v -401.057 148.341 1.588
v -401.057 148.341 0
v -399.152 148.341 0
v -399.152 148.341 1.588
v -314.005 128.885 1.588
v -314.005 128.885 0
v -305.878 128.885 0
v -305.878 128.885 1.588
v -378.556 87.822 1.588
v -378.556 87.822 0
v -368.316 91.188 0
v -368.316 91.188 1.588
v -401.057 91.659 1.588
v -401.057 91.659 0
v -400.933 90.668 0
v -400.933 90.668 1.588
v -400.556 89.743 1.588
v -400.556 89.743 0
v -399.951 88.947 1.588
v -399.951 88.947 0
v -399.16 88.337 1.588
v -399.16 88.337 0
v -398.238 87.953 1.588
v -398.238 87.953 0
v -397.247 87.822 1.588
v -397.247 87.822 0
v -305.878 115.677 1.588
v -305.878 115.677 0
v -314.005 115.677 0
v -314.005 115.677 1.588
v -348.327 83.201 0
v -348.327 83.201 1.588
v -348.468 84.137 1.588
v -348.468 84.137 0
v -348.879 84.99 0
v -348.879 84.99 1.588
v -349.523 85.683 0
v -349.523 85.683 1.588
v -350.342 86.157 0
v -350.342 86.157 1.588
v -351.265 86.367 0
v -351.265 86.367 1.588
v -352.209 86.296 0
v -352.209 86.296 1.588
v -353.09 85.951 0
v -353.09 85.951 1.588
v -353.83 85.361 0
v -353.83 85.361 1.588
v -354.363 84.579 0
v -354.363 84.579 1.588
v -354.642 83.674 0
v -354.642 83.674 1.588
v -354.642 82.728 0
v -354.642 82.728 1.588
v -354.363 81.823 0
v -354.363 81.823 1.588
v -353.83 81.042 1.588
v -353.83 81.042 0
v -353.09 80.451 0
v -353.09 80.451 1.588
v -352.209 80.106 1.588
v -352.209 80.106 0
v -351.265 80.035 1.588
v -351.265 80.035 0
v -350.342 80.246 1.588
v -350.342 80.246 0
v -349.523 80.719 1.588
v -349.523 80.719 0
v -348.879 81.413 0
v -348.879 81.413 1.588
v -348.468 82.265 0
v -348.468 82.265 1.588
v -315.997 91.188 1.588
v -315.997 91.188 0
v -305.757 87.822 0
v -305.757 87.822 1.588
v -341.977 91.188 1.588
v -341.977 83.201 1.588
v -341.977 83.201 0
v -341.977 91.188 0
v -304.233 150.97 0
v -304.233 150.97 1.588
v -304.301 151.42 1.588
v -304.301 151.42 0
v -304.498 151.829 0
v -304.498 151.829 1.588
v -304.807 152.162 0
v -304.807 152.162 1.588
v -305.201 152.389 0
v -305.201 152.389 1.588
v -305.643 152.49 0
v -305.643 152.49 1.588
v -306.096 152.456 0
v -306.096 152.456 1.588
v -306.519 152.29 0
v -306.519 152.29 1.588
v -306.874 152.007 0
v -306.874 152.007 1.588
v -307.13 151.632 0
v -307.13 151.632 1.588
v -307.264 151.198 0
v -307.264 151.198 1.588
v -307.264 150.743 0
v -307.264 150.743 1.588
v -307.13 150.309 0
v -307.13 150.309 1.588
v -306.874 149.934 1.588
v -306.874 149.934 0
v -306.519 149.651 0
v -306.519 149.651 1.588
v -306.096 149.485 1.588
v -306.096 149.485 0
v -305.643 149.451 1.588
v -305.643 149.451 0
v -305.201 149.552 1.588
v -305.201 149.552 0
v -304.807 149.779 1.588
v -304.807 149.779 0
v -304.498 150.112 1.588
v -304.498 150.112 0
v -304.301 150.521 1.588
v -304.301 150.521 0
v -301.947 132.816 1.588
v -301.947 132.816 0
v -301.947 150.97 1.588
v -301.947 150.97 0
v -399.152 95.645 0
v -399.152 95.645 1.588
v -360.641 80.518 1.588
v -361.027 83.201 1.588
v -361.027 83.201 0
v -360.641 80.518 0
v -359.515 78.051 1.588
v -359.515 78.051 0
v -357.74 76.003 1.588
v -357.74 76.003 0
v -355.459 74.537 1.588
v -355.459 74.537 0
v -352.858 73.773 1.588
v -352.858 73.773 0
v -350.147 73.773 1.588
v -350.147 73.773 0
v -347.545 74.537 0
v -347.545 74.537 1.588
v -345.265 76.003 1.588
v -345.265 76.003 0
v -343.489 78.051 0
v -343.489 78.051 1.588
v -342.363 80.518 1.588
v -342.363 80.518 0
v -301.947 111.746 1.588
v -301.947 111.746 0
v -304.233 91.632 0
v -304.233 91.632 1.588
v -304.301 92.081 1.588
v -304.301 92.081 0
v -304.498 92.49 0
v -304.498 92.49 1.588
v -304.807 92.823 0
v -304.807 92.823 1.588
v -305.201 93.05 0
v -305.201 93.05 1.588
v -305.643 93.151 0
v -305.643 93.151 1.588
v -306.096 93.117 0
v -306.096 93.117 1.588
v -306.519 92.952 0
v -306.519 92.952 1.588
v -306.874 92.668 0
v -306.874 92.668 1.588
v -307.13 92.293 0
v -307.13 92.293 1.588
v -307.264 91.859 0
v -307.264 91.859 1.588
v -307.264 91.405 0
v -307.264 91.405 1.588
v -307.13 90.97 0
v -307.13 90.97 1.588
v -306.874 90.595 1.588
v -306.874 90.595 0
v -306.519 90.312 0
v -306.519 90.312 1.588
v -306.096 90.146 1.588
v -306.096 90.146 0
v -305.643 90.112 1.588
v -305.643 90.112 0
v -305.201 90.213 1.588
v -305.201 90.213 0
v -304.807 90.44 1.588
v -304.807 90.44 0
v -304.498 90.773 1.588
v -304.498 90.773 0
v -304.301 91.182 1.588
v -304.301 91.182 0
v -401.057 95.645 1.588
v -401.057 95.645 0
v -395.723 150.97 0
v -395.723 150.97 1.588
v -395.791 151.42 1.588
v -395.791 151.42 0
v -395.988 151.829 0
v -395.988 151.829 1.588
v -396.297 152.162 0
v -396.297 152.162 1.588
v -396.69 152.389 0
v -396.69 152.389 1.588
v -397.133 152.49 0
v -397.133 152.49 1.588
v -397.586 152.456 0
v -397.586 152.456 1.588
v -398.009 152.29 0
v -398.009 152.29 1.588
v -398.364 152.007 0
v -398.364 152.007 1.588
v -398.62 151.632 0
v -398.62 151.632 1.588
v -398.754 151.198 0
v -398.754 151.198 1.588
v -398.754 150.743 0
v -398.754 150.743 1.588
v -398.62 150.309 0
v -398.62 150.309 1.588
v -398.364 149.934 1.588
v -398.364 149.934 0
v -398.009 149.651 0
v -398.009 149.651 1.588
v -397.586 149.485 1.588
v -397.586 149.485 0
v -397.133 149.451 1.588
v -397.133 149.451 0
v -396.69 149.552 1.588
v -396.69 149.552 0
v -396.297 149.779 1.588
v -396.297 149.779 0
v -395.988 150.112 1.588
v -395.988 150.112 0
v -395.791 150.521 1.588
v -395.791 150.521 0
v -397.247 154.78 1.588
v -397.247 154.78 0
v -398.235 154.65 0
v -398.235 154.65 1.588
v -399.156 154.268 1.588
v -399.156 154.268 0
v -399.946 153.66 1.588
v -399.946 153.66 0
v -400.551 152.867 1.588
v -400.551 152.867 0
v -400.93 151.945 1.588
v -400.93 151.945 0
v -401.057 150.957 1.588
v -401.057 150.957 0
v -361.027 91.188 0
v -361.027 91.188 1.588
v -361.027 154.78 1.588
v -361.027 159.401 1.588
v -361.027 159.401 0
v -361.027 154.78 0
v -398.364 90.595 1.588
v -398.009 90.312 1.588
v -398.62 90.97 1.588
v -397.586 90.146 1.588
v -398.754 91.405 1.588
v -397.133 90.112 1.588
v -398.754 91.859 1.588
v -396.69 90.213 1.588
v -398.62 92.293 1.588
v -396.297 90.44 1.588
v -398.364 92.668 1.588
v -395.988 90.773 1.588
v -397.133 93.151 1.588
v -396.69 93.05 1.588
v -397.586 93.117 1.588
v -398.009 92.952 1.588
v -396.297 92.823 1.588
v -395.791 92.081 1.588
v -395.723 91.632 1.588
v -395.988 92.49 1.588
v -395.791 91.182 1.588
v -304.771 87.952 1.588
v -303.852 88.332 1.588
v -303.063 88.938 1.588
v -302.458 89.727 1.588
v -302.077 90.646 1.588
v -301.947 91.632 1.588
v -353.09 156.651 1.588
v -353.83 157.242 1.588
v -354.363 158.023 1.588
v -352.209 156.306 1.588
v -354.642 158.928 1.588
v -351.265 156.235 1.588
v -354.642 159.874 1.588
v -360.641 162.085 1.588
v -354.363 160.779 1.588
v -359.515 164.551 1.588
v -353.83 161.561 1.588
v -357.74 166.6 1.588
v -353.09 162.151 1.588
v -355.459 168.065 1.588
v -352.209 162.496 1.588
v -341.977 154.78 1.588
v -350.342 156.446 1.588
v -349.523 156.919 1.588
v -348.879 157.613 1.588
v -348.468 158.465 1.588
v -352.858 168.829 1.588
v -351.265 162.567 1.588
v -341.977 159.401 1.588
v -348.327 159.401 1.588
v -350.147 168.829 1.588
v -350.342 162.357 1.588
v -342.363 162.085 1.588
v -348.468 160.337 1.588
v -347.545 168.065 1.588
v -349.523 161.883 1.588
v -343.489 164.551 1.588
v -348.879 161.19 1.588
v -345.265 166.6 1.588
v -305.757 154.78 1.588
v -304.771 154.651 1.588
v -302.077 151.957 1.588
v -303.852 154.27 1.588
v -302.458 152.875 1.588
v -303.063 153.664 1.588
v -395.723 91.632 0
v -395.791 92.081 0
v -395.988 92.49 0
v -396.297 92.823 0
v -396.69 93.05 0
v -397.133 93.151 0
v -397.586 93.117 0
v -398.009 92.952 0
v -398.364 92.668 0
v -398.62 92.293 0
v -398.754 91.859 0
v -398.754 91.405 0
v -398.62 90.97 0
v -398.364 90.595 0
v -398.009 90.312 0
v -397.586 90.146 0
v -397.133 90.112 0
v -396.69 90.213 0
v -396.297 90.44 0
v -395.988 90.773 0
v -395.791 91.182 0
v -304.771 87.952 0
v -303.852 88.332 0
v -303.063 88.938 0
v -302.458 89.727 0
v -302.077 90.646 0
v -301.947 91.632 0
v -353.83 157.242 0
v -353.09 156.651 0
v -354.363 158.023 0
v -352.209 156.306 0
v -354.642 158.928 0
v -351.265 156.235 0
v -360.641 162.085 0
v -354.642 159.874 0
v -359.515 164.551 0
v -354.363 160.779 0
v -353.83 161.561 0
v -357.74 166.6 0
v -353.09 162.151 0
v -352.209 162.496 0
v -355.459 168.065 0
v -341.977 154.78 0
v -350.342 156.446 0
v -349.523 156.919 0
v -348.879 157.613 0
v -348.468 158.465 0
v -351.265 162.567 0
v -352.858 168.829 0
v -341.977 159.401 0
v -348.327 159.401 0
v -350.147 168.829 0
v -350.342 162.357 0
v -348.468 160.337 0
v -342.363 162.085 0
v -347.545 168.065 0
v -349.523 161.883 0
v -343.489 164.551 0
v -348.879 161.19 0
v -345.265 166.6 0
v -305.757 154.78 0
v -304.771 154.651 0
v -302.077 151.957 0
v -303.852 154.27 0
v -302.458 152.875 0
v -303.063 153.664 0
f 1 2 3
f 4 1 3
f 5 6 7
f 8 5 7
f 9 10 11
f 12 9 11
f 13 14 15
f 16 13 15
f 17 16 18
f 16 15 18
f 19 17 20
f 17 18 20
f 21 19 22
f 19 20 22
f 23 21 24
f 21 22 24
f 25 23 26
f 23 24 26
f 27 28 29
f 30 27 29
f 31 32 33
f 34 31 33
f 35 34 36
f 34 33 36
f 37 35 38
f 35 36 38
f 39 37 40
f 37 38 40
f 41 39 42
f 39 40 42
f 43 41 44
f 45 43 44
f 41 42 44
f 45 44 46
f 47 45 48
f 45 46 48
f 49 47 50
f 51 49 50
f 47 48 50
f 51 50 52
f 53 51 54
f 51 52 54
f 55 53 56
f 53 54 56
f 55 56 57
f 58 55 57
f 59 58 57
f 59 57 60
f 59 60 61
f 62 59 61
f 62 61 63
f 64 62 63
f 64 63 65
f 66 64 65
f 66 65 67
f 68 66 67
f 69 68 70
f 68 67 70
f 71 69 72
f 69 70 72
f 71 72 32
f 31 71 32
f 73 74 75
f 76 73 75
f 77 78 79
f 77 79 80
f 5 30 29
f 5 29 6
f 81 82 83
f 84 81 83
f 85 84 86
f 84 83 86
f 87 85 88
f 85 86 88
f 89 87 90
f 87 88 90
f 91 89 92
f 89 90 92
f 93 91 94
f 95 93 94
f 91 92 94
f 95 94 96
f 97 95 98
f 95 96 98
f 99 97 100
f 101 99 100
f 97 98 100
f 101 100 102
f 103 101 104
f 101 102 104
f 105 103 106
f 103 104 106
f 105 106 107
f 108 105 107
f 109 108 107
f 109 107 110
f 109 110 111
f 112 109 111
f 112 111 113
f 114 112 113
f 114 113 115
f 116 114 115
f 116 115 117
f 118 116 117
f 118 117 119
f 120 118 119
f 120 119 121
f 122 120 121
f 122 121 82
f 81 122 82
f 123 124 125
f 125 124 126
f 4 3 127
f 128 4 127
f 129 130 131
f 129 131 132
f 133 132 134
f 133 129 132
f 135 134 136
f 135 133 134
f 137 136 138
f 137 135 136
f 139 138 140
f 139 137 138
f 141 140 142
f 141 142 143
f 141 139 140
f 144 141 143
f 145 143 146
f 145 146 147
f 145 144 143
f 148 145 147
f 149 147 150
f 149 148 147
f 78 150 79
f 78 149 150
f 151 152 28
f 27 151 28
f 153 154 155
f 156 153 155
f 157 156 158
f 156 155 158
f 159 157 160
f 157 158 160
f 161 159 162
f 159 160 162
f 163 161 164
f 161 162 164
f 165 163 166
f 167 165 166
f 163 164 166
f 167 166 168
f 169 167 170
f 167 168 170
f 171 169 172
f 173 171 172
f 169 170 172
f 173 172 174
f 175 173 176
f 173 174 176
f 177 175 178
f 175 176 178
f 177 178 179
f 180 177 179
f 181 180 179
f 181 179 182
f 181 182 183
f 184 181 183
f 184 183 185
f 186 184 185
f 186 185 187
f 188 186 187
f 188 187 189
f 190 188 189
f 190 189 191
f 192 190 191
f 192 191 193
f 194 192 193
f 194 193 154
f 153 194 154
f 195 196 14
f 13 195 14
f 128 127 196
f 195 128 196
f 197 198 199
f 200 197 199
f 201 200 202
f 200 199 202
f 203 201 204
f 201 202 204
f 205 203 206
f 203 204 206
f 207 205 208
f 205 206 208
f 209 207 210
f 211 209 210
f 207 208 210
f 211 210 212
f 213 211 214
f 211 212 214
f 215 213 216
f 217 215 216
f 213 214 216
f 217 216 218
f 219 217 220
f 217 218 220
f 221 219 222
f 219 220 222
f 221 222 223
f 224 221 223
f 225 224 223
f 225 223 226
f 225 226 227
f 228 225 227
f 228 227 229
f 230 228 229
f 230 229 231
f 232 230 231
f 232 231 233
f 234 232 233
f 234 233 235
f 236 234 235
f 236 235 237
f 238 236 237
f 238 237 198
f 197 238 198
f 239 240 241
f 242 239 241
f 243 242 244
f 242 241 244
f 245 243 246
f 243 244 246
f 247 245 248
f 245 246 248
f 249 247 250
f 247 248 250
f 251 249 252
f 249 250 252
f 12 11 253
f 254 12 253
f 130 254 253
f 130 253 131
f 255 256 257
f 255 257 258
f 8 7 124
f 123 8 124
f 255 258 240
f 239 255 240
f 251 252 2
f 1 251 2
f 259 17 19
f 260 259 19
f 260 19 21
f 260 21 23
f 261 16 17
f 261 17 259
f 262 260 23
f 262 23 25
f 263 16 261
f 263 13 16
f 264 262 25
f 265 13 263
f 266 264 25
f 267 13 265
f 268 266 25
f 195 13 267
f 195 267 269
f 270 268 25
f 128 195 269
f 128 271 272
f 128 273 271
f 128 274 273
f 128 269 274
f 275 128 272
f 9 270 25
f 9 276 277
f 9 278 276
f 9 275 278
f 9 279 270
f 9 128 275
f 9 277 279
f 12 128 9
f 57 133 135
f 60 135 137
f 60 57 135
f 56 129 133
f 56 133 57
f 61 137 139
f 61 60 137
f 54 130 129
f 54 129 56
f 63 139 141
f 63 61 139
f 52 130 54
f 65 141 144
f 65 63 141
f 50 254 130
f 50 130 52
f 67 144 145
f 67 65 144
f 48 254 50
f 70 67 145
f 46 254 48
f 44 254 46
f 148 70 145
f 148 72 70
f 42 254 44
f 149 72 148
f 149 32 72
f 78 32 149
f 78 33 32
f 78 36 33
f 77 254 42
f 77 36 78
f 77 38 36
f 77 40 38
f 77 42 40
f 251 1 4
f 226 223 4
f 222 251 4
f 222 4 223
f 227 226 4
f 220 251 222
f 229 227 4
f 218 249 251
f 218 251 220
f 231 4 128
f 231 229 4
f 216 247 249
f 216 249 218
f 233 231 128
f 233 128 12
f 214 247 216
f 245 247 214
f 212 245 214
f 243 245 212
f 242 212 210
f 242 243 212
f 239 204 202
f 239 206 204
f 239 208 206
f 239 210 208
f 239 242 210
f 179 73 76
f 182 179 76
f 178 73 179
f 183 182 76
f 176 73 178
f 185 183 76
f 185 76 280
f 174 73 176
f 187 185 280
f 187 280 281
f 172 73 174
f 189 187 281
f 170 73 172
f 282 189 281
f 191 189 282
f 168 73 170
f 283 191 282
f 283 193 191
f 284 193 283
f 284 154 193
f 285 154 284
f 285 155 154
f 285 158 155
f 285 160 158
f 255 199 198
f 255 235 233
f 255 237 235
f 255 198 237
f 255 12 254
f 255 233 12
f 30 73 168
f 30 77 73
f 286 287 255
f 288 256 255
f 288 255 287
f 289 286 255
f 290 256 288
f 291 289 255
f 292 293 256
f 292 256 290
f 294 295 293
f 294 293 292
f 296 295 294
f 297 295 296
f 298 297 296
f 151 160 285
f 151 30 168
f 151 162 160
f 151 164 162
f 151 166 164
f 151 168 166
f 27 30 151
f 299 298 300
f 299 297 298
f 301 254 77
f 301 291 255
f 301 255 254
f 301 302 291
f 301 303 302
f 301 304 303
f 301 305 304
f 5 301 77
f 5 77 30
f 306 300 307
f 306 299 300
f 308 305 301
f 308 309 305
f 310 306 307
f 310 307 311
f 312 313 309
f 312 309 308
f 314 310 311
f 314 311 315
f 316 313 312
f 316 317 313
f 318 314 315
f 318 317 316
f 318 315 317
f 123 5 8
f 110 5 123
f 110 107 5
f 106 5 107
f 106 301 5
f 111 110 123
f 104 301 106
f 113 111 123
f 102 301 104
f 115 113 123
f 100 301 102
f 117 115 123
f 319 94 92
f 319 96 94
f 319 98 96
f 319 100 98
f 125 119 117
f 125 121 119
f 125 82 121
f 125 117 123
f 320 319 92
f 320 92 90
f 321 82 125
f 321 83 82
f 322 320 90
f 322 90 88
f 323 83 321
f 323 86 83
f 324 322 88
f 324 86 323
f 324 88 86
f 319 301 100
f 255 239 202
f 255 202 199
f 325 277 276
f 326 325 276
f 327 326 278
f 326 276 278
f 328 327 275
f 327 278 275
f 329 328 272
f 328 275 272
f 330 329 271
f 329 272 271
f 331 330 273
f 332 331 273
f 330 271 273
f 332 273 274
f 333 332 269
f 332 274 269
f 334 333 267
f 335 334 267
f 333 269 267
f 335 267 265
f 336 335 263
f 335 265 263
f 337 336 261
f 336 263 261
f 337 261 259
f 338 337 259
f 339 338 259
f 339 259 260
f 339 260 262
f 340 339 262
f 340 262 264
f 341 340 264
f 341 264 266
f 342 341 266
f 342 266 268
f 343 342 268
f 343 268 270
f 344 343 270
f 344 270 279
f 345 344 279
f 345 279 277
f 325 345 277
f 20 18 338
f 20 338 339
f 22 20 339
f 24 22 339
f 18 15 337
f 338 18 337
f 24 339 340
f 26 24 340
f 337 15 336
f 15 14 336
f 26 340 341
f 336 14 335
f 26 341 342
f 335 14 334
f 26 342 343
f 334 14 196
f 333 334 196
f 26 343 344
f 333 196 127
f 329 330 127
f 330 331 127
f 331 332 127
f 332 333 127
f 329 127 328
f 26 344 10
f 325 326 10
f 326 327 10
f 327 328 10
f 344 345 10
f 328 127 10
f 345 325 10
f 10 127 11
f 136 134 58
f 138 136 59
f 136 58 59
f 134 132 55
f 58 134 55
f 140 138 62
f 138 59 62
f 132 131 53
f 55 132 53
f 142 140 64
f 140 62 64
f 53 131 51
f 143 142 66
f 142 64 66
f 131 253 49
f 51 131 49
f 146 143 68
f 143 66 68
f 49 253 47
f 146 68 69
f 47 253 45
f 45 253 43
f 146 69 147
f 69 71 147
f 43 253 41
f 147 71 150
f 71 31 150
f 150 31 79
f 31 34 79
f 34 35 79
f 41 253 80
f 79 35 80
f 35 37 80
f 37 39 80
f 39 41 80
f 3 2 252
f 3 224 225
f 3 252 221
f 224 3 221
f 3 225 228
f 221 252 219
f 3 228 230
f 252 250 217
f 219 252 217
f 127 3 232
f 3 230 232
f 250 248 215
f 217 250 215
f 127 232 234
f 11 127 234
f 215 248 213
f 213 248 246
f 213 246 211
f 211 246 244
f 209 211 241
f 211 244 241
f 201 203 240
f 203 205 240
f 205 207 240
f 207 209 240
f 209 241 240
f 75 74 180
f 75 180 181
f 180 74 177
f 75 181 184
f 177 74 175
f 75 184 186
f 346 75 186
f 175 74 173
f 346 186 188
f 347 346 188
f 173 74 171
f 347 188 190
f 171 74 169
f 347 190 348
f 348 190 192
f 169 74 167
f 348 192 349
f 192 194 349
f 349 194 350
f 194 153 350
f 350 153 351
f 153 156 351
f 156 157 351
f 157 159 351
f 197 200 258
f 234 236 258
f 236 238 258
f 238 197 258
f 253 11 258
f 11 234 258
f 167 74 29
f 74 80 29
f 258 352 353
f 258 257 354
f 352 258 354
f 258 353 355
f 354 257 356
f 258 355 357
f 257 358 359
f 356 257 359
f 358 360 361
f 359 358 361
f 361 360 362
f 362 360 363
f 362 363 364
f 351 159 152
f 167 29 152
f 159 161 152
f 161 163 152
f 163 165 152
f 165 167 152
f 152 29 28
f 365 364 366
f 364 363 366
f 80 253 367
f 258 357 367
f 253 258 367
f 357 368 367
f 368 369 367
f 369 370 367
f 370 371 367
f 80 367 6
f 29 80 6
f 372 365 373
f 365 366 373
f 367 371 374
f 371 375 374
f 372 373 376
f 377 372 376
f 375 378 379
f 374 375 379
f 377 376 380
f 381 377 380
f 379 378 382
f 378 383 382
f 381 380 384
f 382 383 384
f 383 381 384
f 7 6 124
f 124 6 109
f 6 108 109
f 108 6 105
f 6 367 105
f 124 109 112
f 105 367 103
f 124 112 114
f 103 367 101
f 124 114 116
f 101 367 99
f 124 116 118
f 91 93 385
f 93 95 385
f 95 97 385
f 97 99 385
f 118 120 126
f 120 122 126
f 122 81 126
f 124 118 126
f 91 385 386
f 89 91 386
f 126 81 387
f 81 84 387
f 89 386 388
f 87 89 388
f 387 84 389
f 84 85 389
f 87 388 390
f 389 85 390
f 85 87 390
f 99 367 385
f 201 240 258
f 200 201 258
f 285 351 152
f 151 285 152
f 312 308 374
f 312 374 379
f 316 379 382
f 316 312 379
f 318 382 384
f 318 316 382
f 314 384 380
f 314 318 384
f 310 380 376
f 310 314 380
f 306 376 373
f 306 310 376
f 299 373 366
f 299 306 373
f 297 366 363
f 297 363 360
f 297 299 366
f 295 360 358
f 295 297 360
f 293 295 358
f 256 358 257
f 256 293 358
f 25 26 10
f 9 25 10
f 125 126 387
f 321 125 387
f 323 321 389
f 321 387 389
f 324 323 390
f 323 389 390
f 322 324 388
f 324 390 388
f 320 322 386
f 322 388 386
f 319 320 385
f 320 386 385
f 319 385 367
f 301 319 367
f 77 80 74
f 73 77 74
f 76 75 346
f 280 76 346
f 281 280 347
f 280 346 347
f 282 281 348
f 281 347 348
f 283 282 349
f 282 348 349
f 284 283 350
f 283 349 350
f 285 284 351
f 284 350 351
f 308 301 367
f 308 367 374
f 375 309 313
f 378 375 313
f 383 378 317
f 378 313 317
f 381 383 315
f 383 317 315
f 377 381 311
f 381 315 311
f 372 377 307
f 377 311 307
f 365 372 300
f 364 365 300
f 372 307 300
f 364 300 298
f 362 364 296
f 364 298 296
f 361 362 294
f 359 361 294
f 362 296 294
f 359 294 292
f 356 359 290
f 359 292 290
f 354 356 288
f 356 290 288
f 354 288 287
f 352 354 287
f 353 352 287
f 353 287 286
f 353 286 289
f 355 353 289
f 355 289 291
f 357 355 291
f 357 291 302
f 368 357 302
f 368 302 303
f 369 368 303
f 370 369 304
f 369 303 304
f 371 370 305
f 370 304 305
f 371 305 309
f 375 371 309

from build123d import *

# Parameters (mm, degrees)
SKETCH1_R           = 1.355900406
BOSS_EXTRUDE1_DEPTH = 1.5875
SKETCH2_R           = 3.175
BOSS_EXTRUDE2_DEPTH = 1.5875
SKETCH3_R           = 1.524
CUT_EXTRUDE1_DEPTH  = 436.184338179
SKETCH5_W           = 2.10299656
SKETCH5_H           = 13.208
BOSS_EXTRUDE3_DEPTH = 1.5875


with BuildPart() as part:
    # Sketch1 → Boss-Extrude1 (new body)
    with BuildSketch(Plane.XY):
        with BuildLine():
            Line((-301.9473, 111.74645), (-305.87795, 115.6771))
            Line((-305.87795, 115.6771), (-316.1078, 115.6771))
            Line((-316.1078, 115.6771), (-316.1078, 128.8851))
            Line((-316.1078, 128.8851), (-305.87795, 128.8851))
            Line((-305.87795, 128.8851), (-301.9473, 132.81575))
            Line((-301.9473, 132.81575), (-301.9473, 150.9704))
            ThreePointArc((-301.9473, 150.9704), (-303.063223164, 153.664476836), (-305.7573, 154.7804))
            Line((-305.7573, 154.7804), (-397.247125, 154.7804))
            ThreePointArc((-397.247125, 154.7804), (-399.946077222, 153.659592612), (-401.0571, 150.956597849))
            Line((-401.0571, 150.956597849), (-401.0571, 148.341))
            Line((-401.0571, 148.341), (-399.1521, 148.341))
            Line((-399.1521, 148.341), (-399.1521, 95.6449))
            Line((-399.1521, 95.6449), (-401.0571, 95.6449))
            Line((-401.0571, 95.6449), (-401.0571, 91.659304166))
            ThreePointArc((-401.0571, 91.659304166), (-399.951018769, 88.947400452), (-397.2472, 87.8217))
            Line((-397.2472, 87.8217), (-378.5565, 87.8217))
            Line((-378.5565, 87.8217), (-368.3165, 91.1883))
            Line((-368.3165, 91.1883), (-315.9973, 91.1883))
            Line((-315.9973, 91.1883), (-305.7573, 87.8217))
            ThreePointArc((-305.7573, 87.8217), (-303.063223164, 88.937623164), (-301.9473, 91.6317))
            Line((-301.9473, 91.6317), (-301.9473, 111.74645))
        make_face()
        with Locations((-305.7573, 91.6317)):
            Circle(SKETCH1_R, mode=Mode.SUBTRACT)
        with Locations((-305.7573, 150.9704)):
            Circle(SKETCH1_R, mode=Mode.SUBTRACT)
        with Locations((-397.247125, 150.9704)):
            Circle(SKETCH1_R, mode=Mode.SUBTRACT)
        with Locations((-397.2472, 91.6317)):
            Circle(SKETCH1_R, mode=Mode.SUBTRACT)
    extrude(amount=BOSS_EXTRUDE1_DEPTH)

    # Sketch2 → Boss-Extrude2 (add)
    # profile 1 of 2: a face of its own
    with BuildSketch(Plane.XY.offset(1.5875)):
        with BuildLine():
            Line((-361.0272, 159.40105), (-361.0272, 154.7804))
            Line((-361.0272, 154.7804), (-341.9772, 154.7804))
            Line((-341.9772, 154.7804), (-341.9772, 159.40105))
            ThreePointArc((-341.9772, 159.40105), (-351.5022, 168.92605), (-361.0272, 159.40105))
        make_face()
        with Locations((-351.5022, 159.40105)):
            Circle(SKETCH2_R, mode=Mode.SUBTRACT)
    # profile 2 of 2: a face of its own
    with BuildSketch(Plane.XY.offset(1.5875)):
        with BuildLine():
            Line((-341.9772, 91.1883), (-361.0272, 91.1883))
            Line((-361.0272, 91.1883), (-361.0272, 83.20105))
            ThreePointArc((-361.0272, 83.20105), (-351.5022, 73.67605), (-341.9772, 83.20105))
            Line((-341.9772, 83.20105), (-341.9772, 91.1883))
        make_face()
        with Locations((-351.5022, 83.20105)):
            Circle(SKETCH2_R, mode=Mode.SUBTRACT)
    extrude(amount=-BOSS_EXTRUDE2_DEPTH)

    # Sketch3 → Cut-Extrude1 (cut, through all)
    with BuildSketch(Plane.XY.offset(1.5875)):
        with Locations((-397.247125, 150.9704)):
            Circle(SKETCH3_R)
        with Locations((-305.7573, 150.9704)):
            Circle(SKETCH3_R)
        with Locations((-305.7573, 91.6317)):
            Circle(SKETCH3_R)
        with Locations((-397.2472, 91.6317)):
            Circle(SKETCH3_R)
    extrude(amount=-CUT_EXTRUDE1_DEPTH, mode=Mode.SUBTRACT)

    # Sketch5 → Boss-Extrude3 (add)
    with BuildSketch(Plane.XY.offset(1.5875)):
        with Locations((-315.05630172, 122.2811)):
            Rectangle(SKETCH5_W, SKETCH5_H)
    extrude(amount=-BOSS_EXTRUDE3_DEPTH)


solid = part.part
